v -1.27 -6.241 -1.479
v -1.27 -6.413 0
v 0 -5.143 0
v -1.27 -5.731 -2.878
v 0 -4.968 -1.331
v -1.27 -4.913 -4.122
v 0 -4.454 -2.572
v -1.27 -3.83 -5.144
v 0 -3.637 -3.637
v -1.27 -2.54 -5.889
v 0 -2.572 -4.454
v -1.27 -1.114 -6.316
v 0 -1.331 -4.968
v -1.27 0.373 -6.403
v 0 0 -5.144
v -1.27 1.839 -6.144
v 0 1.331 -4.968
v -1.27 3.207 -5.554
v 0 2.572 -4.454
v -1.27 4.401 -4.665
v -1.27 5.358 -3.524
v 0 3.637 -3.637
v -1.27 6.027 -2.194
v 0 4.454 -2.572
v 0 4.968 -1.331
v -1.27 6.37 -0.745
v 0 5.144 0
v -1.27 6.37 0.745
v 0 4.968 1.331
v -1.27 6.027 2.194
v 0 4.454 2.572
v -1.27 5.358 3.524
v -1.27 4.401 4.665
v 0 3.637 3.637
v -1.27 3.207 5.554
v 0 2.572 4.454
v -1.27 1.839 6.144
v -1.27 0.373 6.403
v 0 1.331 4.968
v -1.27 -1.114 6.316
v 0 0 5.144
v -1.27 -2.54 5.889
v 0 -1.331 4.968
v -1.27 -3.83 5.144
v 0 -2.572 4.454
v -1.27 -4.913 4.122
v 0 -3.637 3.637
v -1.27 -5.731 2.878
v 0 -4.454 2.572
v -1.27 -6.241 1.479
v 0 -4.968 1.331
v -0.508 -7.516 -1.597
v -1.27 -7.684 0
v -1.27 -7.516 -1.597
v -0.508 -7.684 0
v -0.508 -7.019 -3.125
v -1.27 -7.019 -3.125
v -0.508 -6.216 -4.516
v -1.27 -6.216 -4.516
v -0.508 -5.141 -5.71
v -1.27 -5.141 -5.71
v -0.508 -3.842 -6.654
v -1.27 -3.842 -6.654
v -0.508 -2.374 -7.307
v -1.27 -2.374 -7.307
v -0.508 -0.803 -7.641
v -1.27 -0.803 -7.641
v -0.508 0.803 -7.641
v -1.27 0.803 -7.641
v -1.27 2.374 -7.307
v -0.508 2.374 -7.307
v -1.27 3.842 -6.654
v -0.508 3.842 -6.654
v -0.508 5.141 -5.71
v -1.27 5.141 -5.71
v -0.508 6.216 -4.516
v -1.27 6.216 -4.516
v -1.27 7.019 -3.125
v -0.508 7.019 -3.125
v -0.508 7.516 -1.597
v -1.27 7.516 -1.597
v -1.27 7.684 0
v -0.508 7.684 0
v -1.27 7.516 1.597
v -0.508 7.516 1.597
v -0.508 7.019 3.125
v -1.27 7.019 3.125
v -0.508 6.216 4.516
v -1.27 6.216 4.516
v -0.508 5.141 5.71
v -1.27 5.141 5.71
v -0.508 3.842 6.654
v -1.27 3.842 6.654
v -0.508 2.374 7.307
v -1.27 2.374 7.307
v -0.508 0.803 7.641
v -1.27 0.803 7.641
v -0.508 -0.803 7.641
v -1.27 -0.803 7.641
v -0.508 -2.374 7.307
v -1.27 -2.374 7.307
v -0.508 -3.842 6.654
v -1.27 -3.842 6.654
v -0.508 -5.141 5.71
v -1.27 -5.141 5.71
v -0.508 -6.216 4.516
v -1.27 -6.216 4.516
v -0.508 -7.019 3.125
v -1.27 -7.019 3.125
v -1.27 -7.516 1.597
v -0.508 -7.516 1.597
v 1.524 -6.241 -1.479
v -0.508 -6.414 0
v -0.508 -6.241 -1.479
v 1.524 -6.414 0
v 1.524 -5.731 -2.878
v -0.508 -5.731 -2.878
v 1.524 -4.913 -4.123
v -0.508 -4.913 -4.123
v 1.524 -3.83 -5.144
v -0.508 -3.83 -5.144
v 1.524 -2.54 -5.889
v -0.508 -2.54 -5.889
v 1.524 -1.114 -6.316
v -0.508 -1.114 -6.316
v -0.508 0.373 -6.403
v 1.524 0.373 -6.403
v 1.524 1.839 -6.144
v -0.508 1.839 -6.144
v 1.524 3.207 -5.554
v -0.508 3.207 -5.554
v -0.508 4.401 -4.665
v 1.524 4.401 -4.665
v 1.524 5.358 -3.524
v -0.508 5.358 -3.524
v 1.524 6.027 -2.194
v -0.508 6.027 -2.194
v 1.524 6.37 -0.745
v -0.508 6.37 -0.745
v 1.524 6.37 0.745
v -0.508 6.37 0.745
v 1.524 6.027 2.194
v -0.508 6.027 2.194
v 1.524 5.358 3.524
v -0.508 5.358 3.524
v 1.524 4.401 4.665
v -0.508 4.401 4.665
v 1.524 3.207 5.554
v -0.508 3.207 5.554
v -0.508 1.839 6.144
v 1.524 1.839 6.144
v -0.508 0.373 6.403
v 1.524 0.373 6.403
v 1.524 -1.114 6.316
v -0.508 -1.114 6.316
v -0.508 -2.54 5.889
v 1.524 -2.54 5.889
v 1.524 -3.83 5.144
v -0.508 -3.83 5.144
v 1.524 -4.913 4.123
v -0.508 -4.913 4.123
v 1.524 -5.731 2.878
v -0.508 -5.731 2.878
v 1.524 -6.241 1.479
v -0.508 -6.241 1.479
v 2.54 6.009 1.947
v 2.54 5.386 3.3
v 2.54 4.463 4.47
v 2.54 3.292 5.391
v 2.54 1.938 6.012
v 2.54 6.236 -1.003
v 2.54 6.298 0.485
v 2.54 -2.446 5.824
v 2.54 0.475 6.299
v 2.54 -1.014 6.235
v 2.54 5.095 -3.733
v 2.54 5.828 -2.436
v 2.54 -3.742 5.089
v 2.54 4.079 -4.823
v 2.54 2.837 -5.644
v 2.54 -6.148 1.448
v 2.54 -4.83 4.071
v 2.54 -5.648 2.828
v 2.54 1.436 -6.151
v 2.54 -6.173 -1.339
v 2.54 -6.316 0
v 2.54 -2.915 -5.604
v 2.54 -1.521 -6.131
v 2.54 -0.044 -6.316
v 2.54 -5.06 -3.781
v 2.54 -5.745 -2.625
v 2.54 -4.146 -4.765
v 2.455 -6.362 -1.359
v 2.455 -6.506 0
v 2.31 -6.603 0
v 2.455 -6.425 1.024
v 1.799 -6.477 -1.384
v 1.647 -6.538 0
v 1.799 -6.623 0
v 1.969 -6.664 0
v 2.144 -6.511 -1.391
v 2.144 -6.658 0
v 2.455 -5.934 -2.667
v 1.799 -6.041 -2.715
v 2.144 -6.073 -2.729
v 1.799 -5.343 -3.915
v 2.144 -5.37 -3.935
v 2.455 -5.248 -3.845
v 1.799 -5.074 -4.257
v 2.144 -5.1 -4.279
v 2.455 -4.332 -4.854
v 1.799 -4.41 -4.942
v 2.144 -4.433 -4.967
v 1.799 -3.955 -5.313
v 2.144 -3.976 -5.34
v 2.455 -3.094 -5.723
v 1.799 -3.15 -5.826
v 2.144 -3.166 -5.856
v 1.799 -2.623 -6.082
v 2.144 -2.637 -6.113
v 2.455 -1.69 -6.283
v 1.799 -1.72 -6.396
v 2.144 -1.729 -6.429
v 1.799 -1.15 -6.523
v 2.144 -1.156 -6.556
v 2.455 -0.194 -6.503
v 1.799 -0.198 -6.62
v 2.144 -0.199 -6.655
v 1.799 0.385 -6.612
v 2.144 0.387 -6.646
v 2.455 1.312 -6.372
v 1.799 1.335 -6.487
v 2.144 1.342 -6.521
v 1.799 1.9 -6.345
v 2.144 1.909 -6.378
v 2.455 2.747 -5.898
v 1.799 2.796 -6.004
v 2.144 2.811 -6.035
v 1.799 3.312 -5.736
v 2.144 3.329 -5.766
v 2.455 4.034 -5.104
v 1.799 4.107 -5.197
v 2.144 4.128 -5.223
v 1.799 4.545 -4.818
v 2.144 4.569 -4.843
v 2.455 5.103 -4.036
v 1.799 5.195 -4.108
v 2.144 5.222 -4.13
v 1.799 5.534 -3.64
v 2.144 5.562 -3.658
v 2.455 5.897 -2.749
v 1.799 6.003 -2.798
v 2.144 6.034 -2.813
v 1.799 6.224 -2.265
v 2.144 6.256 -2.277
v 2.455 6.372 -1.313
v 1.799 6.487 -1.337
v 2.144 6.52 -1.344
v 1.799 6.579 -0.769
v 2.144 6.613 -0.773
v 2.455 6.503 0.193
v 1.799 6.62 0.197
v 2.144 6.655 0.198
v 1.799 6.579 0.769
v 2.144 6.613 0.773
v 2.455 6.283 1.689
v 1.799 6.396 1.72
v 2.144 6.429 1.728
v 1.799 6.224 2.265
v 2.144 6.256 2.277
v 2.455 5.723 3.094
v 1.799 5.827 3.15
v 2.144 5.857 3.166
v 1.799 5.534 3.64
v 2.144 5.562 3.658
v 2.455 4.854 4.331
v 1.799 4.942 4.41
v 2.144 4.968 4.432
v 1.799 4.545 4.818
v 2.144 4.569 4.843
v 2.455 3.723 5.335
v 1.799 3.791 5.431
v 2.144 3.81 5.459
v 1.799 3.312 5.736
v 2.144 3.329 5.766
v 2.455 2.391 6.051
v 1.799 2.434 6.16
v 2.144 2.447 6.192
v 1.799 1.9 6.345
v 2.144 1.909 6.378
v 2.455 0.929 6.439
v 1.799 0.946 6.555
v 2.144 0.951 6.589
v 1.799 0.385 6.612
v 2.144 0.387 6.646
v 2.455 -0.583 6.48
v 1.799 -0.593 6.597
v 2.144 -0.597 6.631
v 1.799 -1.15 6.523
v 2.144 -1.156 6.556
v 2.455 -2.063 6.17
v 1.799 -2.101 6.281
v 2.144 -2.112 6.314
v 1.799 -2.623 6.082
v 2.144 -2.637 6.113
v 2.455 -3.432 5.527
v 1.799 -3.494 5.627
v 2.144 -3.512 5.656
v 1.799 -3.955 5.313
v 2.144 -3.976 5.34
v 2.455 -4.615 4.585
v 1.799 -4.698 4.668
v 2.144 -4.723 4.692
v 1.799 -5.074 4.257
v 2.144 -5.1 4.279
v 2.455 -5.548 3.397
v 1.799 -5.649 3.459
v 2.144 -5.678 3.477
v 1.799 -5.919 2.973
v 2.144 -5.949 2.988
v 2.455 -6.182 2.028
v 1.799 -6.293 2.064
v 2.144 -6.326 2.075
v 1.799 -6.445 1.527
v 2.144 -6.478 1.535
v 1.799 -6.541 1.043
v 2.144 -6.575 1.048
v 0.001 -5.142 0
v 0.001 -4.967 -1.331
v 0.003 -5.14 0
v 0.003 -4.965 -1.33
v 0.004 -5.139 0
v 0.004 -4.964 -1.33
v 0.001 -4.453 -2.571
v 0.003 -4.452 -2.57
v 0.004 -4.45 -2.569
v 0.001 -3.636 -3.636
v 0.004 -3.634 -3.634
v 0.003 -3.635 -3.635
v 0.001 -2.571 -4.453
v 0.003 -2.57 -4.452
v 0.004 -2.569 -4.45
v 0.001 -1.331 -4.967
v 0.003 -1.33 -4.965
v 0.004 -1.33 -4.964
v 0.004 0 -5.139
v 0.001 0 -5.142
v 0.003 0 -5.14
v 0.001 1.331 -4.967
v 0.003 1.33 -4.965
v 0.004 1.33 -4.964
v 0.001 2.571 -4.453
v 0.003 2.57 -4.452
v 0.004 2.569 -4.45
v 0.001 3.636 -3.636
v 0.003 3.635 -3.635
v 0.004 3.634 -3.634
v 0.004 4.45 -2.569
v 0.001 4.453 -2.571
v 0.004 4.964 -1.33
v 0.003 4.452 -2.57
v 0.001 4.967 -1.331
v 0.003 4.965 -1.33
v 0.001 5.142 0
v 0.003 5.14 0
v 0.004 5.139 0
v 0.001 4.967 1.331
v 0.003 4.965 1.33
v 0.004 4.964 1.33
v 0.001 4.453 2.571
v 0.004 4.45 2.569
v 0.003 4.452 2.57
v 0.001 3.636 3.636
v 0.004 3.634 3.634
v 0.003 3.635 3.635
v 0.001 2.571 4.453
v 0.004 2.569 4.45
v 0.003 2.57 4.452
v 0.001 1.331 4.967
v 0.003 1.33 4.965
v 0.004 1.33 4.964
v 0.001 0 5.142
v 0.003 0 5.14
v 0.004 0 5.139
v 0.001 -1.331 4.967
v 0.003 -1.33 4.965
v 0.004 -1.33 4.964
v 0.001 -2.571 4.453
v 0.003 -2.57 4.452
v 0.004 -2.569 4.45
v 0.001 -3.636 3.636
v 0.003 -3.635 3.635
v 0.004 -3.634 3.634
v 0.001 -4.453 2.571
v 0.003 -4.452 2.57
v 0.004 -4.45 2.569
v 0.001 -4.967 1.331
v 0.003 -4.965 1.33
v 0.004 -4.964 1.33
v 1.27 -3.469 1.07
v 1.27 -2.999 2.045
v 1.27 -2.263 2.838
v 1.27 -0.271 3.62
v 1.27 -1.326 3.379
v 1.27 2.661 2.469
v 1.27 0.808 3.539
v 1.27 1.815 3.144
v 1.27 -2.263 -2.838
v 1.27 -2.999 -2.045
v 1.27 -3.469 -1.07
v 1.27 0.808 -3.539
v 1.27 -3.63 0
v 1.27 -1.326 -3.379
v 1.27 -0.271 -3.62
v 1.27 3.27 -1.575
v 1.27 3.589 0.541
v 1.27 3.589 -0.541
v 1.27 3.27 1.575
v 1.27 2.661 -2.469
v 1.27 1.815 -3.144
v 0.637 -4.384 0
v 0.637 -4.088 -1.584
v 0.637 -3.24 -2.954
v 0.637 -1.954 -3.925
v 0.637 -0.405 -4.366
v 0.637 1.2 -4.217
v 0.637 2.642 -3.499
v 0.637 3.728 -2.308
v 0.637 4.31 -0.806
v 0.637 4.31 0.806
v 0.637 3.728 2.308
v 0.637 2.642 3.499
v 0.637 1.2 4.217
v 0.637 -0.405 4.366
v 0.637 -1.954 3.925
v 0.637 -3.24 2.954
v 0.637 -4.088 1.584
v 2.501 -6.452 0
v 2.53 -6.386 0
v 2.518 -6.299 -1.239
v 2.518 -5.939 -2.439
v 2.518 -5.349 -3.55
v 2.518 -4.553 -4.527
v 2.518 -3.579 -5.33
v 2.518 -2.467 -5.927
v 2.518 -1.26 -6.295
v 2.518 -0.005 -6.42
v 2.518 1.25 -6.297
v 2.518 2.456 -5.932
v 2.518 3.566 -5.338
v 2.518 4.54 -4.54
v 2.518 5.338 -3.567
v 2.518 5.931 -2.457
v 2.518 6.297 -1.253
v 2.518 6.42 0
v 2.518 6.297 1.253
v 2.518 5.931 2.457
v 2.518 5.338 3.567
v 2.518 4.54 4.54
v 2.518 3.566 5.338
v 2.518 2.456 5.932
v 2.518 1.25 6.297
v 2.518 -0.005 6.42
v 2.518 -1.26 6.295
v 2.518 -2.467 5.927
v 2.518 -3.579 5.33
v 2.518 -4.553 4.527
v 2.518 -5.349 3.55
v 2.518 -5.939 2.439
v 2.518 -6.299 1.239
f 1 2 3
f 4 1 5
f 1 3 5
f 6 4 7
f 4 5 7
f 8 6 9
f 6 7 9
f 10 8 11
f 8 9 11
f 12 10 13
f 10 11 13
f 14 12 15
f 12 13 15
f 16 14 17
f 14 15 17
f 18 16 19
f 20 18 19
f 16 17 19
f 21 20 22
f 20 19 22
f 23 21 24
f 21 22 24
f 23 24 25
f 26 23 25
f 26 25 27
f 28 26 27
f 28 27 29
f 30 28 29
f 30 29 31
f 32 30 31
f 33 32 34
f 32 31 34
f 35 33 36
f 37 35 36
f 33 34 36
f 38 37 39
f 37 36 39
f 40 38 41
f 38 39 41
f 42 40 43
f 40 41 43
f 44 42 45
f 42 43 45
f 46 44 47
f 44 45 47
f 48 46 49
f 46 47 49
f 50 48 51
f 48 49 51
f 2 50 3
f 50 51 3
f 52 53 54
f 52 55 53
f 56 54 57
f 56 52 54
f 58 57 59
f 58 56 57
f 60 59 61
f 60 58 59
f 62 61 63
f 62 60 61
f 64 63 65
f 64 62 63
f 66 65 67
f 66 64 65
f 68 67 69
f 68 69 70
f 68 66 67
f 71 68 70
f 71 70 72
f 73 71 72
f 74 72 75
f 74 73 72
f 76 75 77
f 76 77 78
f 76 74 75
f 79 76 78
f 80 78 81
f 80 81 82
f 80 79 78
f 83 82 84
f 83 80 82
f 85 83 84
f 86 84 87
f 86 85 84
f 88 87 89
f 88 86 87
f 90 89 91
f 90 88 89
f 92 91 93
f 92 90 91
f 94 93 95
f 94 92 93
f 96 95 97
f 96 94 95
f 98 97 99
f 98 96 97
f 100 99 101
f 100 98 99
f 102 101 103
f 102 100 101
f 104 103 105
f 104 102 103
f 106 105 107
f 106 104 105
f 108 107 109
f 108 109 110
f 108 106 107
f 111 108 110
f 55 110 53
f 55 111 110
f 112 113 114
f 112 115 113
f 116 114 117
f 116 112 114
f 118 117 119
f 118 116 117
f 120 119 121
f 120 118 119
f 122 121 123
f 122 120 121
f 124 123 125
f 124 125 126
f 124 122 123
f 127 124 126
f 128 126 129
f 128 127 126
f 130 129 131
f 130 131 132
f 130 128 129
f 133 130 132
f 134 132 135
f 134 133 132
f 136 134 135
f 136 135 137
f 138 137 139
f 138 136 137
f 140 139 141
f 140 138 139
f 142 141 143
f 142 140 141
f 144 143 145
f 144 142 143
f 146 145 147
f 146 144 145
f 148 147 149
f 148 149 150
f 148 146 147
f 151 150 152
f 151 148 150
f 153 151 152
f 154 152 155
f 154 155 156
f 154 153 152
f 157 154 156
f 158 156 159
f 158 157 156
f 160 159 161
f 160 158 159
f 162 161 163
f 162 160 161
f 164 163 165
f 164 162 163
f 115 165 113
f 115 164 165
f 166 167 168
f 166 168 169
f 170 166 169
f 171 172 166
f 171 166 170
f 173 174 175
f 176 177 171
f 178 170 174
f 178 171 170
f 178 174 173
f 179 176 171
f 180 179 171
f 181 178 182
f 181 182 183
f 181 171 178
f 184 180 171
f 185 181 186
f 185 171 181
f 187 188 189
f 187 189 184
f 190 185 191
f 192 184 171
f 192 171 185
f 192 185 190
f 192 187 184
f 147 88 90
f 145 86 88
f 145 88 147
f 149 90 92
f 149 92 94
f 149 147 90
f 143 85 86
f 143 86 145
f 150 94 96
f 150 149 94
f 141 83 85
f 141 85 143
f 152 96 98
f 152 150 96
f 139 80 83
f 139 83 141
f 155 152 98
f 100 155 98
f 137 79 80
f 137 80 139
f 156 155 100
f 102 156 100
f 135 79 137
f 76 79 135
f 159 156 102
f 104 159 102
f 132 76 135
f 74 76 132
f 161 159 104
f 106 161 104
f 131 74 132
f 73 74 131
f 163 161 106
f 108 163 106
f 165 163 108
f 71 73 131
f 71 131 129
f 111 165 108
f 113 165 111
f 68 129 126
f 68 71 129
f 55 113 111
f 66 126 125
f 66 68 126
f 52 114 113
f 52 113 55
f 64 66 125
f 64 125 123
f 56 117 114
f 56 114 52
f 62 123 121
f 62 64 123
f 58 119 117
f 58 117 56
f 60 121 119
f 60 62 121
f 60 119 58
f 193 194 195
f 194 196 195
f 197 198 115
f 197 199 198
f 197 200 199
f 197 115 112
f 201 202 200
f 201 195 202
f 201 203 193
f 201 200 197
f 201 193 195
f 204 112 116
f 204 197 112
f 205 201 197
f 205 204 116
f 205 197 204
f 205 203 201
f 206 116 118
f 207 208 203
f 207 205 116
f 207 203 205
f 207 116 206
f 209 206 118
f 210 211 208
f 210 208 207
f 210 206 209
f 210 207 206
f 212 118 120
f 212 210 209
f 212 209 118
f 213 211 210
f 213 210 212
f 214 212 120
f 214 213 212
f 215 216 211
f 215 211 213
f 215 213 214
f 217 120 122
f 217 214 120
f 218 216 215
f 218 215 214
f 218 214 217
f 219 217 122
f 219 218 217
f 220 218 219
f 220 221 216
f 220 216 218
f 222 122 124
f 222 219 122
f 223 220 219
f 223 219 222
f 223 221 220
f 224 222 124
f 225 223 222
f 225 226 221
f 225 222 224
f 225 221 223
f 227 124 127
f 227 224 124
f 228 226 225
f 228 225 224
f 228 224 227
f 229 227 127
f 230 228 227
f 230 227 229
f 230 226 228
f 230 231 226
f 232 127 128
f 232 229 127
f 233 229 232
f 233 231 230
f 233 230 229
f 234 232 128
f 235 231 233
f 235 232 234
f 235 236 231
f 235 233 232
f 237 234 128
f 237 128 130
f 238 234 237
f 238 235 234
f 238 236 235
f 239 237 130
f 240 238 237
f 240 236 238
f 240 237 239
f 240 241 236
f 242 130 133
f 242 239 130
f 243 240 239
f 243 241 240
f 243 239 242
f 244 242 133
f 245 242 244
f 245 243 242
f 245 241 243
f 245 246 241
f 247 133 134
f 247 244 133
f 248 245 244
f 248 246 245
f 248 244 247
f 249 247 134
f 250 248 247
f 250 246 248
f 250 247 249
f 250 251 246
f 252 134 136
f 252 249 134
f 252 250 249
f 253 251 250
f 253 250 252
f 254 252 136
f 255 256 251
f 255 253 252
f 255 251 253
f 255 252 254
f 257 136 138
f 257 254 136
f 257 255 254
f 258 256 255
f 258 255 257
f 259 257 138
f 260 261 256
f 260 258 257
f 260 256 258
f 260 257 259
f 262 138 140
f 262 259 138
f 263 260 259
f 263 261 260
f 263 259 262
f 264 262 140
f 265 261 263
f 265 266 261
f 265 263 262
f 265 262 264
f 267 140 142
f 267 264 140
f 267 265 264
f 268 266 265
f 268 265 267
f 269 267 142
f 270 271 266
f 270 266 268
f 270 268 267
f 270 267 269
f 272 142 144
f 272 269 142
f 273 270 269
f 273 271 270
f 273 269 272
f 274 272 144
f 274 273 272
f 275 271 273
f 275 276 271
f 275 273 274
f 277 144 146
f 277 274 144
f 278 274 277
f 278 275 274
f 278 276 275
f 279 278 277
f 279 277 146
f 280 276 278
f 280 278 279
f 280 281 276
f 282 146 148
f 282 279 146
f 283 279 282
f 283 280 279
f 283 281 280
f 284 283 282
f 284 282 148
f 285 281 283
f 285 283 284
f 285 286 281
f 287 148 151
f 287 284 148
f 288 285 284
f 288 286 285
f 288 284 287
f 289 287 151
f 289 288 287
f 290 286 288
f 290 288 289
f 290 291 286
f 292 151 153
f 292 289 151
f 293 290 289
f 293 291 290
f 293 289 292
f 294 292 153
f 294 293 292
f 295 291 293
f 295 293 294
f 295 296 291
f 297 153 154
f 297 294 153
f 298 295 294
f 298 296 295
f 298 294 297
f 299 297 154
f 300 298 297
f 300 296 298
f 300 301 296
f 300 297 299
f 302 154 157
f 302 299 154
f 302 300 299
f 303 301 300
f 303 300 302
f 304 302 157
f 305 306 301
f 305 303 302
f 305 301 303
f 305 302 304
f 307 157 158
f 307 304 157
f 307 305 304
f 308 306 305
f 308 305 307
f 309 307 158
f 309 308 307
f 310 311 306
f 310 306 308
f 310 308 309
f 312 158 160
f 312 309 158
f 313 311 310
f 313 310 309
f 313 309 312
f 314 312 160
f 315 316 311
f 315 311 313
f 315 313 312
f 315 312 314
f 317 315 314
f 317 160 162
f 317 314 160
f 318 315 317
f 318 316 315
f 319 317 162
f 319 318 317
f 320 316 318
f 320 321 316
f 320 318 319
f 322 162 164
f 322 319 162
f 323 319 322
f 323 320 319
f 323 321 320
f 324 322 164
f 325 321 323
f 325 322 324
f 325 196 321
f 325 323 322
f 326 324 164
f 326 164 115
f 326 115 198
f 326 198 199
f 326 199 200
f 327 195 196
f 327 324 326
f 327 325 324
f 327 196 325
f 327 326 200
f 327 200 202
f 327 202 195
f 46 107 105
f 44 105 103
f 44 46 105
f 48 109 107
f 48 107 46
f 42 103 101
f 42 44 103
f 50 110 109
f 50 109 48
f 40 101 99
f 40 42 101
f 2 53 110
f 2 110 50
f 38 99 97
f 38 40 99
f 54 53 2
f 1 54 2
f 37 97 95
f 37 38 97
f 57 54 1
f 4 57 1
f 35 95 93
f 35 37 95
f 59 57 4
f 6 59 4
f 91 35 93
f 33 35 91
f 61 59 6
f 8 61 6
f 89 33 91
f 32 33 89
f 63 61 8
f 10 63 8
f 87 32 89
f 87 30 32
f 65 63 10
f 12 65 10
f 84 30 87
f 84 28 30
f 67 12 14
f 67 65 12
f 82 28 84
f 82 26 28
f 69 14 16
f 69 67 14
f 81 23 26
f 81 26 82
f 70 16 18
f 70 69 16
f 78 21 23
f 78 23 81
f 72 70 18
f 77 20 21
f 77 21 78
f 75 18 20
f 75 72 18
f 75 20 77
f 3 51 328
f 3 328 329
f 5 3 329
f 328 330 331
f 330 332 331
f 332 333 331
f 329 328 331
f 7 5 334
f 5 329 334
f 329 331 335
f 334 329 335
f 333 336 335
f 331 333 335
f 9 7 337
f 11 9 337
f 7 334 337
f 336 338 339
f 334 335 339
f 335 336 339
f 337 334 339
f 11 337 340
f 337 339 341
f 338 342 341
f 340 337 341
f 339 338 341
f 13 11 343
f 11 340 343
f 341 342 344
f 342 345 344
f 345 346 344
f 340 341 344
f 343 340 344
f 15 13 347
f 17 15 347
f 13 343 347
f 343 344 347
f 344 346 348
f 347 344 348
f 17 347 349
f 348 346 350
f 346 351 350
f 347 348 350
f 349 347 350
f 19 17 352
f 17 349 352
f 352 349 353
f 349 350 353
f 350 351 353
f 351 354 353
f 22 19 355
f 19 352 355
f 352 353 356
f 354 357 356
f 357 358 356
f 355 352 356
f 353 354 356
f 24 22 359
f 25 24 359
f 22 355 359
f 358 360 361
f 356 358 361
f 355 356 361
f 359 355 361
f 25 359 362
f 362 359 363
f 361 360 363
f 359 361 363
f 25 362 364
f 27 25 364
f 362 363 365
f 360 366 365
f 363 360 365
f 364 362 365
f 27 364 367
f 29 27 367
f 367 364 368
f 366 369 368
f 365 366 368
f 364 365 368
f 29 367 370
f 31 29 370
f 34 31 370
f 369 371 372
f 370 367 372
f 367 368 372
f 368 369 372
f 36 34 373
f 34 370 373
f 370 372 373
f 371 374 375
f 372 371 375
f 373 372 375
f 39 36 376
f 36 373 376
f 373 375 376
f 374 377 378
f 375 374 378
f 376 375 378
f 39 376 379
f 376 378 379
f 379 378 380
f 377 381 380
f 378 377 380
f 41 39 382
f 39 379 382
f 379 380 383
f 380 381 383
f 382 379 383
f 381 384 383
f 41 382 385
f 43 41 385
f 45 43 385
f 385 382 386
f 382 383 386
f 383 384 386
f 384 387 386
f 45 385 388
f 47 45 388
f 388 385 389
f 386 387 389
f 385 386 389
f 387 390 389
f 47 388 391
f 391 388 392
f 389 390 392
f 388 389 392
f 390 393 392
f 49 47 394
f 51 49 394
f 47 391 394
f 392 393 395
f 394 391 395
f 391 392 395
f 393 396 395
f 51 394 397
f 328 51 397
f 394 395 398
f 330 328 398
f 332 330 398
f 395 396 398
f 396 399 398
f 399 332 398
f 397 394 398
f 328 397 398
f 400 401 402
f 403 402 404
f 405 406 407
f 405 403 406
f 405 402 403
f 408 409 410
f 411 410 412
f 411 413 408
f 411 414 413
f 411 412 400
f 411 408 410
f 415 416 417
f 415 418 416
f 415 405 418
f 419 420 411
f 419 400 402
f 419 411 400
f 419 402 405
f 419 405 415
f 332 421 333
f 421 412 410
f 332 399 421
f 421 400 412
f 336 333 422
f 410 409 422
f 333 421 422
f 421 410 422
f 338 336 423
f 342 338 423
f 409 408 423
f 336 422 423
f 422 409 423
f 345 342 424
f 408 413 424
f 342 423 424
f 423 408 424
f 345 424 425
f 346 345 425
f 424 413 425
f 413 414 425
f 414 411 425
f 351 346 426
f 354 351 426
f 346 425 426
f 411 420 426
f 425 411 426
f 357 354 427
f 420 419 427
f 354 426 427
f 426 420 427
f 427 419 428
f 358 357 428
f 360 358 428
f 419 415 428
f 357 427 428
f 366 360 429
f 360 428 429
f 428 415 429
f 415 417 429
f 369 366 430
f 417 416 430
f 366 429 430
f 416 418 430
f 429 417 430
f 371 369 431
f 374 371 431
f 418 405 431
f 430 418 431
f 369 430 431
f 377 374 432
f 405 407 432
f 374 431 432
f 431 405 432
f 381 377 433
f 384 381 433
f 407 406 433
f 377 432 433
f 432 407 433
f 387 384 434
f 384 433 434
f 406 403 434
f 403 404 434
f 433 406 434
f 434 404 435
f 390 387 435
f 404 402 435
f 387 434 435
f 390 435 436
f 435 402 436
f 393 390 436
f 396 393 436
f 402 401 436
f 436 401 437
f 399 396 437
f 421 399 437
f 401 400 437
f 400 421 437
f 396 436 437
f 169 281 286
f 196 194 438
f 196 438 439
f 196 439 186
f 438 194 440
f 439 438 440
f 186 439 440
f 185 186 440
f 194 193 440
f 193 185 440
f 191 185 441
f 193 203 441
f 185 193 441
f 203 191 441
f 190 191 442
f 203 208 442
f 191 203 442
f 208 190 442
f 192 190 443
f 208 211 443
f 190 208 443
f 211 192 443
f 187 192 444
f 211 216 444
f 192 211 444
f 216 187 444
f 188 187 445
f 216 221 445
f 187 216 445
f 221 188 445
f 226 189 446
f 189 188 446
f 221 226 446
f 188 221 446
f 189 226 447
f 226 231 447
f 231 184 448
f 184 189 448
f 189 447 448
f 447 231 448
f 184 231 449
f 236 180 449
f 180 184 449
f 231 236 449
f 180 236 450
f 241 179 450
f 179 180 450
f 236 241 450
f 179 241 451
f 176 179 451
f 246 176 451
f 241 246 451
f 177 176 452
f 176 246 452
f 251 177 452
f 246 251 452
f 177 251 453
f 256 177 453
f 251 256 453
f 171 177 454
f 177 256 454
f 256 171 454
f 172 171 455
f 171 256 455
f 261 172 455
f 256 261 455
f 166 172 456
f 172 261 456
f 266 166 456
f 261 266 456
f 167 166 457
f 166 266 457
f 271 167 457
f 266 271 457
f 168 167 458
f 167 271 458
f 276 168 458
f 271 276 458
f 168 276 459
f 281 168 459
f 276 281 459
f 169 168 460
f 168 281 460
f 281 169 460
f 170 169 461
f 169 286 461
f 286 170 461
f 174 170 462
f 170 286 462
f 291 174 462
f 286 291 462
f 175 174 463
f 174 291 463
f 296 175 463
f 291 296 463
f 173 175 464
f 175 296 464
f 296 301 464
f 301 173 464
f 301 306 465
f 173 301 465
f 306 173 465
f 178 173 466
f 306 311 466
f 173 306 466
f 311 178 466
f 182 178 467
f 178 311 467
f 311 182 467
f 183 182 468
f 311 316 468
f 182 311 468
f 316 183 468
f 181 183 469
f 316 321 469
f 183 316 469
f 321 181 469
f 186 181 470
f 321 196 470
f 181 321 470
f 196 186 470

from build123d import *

# Parameters (mm, degrees)
CHAMFER1_SIZE  = 1.27
CHAMFER1_SIZE2 = 1.513527063
FILLET1_R      = 0.254
CHAMFER3_SIZE  = 1.27
FILLET2_R      = 0.254


# Some blends are built 0.0001 mm under size
with BuildPart() as part:
    # Sketch1 → Revolve1 (revolve)
    with BuildSketch(Plane.XY, mode=Mode.PRIVATE) as revolve1_sk:
        with BuildLine():
            Line((-0.508, 7.6835), (-0.508, 6.4135))
            Line((-0.508, 6.4135), (1.524, 6.4135))
            ThreePointArc((1.524, 6.4135), (2.032, 6.6675), (2.54, 6.4135))
            Line((2.54, 6.4135), (2.54, 0))
            Line((2.54, 0), (1.27, 0))
            Line((1.27, 0), (1.27, 5.1435))
            Line((1.27, 5.1435), (-1.27, 5.1435))
            Line((-1.27, 5.1435), (-1.27, 7.6835))
            Line((-1.27, 7.6835), (-0.508, 7.6835))
        make_face()
    revolve(revolve1_sk.sketch.rotate(Axis((-6.503305215, 0, 0), (1, 0, 0)), 180), axis=Axis((-6.503305215, 0, 0), (1, 0, 0)))

    # Chamfer1
    chamfer1_edges = [part.edges().sort_by_distance(p)[0] for p in [
        (1.27, 5.1435, 0),
    ]]
    chamfer1_side = [part.faces().sort_by_distance(p)[0] for p in [
        (0, 5.1435, 0),
    ]]
    chamfer(chamfer1_edges, length=CHAMFER1_SIZE, length2=CHAMFER1_SIZE2, reference=chamfer1_side[0])

    # Fillet1
    fillet1_edges = [part.edges().sort_by_distance(p)[0] for p in [
        (2.54, 6.4135, 0),
    ]]
    fillet(fillet1_edges, radius=FILLET1_R)

    # Chamfer3
    chamfer3_edges = [part.edges().sort_by_distance(p)[0] for p in [
        (-1.27, 5.1435, 0),
    ]]
    chamfer(chamfer3_edges, length=CHAMFER3_SIZE - 0.0001)  # a hair under: the kernel refuses the full size

    # Fillet2
    # the kernel refuses this fillet: 0.254 mm, written as the material it adds along each edge
    with BuildSketch(Plane(origin=(0, 0, 0), x_dir=(0, -1, 0), z_dir=(0, 0, 1))) as fillet2_piece_1:
        with BuildLine():
            CenterArc((4.975502814, -0.190607075), FILLET2_R, 48.592790784, 1.407209216)
            Line((5.138770867, 0.003968214), (5.1435, 0))
            Line((5.1435, 0), (5.1435, -0.0001))
        make_face()
    revolve(axis=Axis((0, 0, 0), (1, 0, 0)))


solid = part.part
